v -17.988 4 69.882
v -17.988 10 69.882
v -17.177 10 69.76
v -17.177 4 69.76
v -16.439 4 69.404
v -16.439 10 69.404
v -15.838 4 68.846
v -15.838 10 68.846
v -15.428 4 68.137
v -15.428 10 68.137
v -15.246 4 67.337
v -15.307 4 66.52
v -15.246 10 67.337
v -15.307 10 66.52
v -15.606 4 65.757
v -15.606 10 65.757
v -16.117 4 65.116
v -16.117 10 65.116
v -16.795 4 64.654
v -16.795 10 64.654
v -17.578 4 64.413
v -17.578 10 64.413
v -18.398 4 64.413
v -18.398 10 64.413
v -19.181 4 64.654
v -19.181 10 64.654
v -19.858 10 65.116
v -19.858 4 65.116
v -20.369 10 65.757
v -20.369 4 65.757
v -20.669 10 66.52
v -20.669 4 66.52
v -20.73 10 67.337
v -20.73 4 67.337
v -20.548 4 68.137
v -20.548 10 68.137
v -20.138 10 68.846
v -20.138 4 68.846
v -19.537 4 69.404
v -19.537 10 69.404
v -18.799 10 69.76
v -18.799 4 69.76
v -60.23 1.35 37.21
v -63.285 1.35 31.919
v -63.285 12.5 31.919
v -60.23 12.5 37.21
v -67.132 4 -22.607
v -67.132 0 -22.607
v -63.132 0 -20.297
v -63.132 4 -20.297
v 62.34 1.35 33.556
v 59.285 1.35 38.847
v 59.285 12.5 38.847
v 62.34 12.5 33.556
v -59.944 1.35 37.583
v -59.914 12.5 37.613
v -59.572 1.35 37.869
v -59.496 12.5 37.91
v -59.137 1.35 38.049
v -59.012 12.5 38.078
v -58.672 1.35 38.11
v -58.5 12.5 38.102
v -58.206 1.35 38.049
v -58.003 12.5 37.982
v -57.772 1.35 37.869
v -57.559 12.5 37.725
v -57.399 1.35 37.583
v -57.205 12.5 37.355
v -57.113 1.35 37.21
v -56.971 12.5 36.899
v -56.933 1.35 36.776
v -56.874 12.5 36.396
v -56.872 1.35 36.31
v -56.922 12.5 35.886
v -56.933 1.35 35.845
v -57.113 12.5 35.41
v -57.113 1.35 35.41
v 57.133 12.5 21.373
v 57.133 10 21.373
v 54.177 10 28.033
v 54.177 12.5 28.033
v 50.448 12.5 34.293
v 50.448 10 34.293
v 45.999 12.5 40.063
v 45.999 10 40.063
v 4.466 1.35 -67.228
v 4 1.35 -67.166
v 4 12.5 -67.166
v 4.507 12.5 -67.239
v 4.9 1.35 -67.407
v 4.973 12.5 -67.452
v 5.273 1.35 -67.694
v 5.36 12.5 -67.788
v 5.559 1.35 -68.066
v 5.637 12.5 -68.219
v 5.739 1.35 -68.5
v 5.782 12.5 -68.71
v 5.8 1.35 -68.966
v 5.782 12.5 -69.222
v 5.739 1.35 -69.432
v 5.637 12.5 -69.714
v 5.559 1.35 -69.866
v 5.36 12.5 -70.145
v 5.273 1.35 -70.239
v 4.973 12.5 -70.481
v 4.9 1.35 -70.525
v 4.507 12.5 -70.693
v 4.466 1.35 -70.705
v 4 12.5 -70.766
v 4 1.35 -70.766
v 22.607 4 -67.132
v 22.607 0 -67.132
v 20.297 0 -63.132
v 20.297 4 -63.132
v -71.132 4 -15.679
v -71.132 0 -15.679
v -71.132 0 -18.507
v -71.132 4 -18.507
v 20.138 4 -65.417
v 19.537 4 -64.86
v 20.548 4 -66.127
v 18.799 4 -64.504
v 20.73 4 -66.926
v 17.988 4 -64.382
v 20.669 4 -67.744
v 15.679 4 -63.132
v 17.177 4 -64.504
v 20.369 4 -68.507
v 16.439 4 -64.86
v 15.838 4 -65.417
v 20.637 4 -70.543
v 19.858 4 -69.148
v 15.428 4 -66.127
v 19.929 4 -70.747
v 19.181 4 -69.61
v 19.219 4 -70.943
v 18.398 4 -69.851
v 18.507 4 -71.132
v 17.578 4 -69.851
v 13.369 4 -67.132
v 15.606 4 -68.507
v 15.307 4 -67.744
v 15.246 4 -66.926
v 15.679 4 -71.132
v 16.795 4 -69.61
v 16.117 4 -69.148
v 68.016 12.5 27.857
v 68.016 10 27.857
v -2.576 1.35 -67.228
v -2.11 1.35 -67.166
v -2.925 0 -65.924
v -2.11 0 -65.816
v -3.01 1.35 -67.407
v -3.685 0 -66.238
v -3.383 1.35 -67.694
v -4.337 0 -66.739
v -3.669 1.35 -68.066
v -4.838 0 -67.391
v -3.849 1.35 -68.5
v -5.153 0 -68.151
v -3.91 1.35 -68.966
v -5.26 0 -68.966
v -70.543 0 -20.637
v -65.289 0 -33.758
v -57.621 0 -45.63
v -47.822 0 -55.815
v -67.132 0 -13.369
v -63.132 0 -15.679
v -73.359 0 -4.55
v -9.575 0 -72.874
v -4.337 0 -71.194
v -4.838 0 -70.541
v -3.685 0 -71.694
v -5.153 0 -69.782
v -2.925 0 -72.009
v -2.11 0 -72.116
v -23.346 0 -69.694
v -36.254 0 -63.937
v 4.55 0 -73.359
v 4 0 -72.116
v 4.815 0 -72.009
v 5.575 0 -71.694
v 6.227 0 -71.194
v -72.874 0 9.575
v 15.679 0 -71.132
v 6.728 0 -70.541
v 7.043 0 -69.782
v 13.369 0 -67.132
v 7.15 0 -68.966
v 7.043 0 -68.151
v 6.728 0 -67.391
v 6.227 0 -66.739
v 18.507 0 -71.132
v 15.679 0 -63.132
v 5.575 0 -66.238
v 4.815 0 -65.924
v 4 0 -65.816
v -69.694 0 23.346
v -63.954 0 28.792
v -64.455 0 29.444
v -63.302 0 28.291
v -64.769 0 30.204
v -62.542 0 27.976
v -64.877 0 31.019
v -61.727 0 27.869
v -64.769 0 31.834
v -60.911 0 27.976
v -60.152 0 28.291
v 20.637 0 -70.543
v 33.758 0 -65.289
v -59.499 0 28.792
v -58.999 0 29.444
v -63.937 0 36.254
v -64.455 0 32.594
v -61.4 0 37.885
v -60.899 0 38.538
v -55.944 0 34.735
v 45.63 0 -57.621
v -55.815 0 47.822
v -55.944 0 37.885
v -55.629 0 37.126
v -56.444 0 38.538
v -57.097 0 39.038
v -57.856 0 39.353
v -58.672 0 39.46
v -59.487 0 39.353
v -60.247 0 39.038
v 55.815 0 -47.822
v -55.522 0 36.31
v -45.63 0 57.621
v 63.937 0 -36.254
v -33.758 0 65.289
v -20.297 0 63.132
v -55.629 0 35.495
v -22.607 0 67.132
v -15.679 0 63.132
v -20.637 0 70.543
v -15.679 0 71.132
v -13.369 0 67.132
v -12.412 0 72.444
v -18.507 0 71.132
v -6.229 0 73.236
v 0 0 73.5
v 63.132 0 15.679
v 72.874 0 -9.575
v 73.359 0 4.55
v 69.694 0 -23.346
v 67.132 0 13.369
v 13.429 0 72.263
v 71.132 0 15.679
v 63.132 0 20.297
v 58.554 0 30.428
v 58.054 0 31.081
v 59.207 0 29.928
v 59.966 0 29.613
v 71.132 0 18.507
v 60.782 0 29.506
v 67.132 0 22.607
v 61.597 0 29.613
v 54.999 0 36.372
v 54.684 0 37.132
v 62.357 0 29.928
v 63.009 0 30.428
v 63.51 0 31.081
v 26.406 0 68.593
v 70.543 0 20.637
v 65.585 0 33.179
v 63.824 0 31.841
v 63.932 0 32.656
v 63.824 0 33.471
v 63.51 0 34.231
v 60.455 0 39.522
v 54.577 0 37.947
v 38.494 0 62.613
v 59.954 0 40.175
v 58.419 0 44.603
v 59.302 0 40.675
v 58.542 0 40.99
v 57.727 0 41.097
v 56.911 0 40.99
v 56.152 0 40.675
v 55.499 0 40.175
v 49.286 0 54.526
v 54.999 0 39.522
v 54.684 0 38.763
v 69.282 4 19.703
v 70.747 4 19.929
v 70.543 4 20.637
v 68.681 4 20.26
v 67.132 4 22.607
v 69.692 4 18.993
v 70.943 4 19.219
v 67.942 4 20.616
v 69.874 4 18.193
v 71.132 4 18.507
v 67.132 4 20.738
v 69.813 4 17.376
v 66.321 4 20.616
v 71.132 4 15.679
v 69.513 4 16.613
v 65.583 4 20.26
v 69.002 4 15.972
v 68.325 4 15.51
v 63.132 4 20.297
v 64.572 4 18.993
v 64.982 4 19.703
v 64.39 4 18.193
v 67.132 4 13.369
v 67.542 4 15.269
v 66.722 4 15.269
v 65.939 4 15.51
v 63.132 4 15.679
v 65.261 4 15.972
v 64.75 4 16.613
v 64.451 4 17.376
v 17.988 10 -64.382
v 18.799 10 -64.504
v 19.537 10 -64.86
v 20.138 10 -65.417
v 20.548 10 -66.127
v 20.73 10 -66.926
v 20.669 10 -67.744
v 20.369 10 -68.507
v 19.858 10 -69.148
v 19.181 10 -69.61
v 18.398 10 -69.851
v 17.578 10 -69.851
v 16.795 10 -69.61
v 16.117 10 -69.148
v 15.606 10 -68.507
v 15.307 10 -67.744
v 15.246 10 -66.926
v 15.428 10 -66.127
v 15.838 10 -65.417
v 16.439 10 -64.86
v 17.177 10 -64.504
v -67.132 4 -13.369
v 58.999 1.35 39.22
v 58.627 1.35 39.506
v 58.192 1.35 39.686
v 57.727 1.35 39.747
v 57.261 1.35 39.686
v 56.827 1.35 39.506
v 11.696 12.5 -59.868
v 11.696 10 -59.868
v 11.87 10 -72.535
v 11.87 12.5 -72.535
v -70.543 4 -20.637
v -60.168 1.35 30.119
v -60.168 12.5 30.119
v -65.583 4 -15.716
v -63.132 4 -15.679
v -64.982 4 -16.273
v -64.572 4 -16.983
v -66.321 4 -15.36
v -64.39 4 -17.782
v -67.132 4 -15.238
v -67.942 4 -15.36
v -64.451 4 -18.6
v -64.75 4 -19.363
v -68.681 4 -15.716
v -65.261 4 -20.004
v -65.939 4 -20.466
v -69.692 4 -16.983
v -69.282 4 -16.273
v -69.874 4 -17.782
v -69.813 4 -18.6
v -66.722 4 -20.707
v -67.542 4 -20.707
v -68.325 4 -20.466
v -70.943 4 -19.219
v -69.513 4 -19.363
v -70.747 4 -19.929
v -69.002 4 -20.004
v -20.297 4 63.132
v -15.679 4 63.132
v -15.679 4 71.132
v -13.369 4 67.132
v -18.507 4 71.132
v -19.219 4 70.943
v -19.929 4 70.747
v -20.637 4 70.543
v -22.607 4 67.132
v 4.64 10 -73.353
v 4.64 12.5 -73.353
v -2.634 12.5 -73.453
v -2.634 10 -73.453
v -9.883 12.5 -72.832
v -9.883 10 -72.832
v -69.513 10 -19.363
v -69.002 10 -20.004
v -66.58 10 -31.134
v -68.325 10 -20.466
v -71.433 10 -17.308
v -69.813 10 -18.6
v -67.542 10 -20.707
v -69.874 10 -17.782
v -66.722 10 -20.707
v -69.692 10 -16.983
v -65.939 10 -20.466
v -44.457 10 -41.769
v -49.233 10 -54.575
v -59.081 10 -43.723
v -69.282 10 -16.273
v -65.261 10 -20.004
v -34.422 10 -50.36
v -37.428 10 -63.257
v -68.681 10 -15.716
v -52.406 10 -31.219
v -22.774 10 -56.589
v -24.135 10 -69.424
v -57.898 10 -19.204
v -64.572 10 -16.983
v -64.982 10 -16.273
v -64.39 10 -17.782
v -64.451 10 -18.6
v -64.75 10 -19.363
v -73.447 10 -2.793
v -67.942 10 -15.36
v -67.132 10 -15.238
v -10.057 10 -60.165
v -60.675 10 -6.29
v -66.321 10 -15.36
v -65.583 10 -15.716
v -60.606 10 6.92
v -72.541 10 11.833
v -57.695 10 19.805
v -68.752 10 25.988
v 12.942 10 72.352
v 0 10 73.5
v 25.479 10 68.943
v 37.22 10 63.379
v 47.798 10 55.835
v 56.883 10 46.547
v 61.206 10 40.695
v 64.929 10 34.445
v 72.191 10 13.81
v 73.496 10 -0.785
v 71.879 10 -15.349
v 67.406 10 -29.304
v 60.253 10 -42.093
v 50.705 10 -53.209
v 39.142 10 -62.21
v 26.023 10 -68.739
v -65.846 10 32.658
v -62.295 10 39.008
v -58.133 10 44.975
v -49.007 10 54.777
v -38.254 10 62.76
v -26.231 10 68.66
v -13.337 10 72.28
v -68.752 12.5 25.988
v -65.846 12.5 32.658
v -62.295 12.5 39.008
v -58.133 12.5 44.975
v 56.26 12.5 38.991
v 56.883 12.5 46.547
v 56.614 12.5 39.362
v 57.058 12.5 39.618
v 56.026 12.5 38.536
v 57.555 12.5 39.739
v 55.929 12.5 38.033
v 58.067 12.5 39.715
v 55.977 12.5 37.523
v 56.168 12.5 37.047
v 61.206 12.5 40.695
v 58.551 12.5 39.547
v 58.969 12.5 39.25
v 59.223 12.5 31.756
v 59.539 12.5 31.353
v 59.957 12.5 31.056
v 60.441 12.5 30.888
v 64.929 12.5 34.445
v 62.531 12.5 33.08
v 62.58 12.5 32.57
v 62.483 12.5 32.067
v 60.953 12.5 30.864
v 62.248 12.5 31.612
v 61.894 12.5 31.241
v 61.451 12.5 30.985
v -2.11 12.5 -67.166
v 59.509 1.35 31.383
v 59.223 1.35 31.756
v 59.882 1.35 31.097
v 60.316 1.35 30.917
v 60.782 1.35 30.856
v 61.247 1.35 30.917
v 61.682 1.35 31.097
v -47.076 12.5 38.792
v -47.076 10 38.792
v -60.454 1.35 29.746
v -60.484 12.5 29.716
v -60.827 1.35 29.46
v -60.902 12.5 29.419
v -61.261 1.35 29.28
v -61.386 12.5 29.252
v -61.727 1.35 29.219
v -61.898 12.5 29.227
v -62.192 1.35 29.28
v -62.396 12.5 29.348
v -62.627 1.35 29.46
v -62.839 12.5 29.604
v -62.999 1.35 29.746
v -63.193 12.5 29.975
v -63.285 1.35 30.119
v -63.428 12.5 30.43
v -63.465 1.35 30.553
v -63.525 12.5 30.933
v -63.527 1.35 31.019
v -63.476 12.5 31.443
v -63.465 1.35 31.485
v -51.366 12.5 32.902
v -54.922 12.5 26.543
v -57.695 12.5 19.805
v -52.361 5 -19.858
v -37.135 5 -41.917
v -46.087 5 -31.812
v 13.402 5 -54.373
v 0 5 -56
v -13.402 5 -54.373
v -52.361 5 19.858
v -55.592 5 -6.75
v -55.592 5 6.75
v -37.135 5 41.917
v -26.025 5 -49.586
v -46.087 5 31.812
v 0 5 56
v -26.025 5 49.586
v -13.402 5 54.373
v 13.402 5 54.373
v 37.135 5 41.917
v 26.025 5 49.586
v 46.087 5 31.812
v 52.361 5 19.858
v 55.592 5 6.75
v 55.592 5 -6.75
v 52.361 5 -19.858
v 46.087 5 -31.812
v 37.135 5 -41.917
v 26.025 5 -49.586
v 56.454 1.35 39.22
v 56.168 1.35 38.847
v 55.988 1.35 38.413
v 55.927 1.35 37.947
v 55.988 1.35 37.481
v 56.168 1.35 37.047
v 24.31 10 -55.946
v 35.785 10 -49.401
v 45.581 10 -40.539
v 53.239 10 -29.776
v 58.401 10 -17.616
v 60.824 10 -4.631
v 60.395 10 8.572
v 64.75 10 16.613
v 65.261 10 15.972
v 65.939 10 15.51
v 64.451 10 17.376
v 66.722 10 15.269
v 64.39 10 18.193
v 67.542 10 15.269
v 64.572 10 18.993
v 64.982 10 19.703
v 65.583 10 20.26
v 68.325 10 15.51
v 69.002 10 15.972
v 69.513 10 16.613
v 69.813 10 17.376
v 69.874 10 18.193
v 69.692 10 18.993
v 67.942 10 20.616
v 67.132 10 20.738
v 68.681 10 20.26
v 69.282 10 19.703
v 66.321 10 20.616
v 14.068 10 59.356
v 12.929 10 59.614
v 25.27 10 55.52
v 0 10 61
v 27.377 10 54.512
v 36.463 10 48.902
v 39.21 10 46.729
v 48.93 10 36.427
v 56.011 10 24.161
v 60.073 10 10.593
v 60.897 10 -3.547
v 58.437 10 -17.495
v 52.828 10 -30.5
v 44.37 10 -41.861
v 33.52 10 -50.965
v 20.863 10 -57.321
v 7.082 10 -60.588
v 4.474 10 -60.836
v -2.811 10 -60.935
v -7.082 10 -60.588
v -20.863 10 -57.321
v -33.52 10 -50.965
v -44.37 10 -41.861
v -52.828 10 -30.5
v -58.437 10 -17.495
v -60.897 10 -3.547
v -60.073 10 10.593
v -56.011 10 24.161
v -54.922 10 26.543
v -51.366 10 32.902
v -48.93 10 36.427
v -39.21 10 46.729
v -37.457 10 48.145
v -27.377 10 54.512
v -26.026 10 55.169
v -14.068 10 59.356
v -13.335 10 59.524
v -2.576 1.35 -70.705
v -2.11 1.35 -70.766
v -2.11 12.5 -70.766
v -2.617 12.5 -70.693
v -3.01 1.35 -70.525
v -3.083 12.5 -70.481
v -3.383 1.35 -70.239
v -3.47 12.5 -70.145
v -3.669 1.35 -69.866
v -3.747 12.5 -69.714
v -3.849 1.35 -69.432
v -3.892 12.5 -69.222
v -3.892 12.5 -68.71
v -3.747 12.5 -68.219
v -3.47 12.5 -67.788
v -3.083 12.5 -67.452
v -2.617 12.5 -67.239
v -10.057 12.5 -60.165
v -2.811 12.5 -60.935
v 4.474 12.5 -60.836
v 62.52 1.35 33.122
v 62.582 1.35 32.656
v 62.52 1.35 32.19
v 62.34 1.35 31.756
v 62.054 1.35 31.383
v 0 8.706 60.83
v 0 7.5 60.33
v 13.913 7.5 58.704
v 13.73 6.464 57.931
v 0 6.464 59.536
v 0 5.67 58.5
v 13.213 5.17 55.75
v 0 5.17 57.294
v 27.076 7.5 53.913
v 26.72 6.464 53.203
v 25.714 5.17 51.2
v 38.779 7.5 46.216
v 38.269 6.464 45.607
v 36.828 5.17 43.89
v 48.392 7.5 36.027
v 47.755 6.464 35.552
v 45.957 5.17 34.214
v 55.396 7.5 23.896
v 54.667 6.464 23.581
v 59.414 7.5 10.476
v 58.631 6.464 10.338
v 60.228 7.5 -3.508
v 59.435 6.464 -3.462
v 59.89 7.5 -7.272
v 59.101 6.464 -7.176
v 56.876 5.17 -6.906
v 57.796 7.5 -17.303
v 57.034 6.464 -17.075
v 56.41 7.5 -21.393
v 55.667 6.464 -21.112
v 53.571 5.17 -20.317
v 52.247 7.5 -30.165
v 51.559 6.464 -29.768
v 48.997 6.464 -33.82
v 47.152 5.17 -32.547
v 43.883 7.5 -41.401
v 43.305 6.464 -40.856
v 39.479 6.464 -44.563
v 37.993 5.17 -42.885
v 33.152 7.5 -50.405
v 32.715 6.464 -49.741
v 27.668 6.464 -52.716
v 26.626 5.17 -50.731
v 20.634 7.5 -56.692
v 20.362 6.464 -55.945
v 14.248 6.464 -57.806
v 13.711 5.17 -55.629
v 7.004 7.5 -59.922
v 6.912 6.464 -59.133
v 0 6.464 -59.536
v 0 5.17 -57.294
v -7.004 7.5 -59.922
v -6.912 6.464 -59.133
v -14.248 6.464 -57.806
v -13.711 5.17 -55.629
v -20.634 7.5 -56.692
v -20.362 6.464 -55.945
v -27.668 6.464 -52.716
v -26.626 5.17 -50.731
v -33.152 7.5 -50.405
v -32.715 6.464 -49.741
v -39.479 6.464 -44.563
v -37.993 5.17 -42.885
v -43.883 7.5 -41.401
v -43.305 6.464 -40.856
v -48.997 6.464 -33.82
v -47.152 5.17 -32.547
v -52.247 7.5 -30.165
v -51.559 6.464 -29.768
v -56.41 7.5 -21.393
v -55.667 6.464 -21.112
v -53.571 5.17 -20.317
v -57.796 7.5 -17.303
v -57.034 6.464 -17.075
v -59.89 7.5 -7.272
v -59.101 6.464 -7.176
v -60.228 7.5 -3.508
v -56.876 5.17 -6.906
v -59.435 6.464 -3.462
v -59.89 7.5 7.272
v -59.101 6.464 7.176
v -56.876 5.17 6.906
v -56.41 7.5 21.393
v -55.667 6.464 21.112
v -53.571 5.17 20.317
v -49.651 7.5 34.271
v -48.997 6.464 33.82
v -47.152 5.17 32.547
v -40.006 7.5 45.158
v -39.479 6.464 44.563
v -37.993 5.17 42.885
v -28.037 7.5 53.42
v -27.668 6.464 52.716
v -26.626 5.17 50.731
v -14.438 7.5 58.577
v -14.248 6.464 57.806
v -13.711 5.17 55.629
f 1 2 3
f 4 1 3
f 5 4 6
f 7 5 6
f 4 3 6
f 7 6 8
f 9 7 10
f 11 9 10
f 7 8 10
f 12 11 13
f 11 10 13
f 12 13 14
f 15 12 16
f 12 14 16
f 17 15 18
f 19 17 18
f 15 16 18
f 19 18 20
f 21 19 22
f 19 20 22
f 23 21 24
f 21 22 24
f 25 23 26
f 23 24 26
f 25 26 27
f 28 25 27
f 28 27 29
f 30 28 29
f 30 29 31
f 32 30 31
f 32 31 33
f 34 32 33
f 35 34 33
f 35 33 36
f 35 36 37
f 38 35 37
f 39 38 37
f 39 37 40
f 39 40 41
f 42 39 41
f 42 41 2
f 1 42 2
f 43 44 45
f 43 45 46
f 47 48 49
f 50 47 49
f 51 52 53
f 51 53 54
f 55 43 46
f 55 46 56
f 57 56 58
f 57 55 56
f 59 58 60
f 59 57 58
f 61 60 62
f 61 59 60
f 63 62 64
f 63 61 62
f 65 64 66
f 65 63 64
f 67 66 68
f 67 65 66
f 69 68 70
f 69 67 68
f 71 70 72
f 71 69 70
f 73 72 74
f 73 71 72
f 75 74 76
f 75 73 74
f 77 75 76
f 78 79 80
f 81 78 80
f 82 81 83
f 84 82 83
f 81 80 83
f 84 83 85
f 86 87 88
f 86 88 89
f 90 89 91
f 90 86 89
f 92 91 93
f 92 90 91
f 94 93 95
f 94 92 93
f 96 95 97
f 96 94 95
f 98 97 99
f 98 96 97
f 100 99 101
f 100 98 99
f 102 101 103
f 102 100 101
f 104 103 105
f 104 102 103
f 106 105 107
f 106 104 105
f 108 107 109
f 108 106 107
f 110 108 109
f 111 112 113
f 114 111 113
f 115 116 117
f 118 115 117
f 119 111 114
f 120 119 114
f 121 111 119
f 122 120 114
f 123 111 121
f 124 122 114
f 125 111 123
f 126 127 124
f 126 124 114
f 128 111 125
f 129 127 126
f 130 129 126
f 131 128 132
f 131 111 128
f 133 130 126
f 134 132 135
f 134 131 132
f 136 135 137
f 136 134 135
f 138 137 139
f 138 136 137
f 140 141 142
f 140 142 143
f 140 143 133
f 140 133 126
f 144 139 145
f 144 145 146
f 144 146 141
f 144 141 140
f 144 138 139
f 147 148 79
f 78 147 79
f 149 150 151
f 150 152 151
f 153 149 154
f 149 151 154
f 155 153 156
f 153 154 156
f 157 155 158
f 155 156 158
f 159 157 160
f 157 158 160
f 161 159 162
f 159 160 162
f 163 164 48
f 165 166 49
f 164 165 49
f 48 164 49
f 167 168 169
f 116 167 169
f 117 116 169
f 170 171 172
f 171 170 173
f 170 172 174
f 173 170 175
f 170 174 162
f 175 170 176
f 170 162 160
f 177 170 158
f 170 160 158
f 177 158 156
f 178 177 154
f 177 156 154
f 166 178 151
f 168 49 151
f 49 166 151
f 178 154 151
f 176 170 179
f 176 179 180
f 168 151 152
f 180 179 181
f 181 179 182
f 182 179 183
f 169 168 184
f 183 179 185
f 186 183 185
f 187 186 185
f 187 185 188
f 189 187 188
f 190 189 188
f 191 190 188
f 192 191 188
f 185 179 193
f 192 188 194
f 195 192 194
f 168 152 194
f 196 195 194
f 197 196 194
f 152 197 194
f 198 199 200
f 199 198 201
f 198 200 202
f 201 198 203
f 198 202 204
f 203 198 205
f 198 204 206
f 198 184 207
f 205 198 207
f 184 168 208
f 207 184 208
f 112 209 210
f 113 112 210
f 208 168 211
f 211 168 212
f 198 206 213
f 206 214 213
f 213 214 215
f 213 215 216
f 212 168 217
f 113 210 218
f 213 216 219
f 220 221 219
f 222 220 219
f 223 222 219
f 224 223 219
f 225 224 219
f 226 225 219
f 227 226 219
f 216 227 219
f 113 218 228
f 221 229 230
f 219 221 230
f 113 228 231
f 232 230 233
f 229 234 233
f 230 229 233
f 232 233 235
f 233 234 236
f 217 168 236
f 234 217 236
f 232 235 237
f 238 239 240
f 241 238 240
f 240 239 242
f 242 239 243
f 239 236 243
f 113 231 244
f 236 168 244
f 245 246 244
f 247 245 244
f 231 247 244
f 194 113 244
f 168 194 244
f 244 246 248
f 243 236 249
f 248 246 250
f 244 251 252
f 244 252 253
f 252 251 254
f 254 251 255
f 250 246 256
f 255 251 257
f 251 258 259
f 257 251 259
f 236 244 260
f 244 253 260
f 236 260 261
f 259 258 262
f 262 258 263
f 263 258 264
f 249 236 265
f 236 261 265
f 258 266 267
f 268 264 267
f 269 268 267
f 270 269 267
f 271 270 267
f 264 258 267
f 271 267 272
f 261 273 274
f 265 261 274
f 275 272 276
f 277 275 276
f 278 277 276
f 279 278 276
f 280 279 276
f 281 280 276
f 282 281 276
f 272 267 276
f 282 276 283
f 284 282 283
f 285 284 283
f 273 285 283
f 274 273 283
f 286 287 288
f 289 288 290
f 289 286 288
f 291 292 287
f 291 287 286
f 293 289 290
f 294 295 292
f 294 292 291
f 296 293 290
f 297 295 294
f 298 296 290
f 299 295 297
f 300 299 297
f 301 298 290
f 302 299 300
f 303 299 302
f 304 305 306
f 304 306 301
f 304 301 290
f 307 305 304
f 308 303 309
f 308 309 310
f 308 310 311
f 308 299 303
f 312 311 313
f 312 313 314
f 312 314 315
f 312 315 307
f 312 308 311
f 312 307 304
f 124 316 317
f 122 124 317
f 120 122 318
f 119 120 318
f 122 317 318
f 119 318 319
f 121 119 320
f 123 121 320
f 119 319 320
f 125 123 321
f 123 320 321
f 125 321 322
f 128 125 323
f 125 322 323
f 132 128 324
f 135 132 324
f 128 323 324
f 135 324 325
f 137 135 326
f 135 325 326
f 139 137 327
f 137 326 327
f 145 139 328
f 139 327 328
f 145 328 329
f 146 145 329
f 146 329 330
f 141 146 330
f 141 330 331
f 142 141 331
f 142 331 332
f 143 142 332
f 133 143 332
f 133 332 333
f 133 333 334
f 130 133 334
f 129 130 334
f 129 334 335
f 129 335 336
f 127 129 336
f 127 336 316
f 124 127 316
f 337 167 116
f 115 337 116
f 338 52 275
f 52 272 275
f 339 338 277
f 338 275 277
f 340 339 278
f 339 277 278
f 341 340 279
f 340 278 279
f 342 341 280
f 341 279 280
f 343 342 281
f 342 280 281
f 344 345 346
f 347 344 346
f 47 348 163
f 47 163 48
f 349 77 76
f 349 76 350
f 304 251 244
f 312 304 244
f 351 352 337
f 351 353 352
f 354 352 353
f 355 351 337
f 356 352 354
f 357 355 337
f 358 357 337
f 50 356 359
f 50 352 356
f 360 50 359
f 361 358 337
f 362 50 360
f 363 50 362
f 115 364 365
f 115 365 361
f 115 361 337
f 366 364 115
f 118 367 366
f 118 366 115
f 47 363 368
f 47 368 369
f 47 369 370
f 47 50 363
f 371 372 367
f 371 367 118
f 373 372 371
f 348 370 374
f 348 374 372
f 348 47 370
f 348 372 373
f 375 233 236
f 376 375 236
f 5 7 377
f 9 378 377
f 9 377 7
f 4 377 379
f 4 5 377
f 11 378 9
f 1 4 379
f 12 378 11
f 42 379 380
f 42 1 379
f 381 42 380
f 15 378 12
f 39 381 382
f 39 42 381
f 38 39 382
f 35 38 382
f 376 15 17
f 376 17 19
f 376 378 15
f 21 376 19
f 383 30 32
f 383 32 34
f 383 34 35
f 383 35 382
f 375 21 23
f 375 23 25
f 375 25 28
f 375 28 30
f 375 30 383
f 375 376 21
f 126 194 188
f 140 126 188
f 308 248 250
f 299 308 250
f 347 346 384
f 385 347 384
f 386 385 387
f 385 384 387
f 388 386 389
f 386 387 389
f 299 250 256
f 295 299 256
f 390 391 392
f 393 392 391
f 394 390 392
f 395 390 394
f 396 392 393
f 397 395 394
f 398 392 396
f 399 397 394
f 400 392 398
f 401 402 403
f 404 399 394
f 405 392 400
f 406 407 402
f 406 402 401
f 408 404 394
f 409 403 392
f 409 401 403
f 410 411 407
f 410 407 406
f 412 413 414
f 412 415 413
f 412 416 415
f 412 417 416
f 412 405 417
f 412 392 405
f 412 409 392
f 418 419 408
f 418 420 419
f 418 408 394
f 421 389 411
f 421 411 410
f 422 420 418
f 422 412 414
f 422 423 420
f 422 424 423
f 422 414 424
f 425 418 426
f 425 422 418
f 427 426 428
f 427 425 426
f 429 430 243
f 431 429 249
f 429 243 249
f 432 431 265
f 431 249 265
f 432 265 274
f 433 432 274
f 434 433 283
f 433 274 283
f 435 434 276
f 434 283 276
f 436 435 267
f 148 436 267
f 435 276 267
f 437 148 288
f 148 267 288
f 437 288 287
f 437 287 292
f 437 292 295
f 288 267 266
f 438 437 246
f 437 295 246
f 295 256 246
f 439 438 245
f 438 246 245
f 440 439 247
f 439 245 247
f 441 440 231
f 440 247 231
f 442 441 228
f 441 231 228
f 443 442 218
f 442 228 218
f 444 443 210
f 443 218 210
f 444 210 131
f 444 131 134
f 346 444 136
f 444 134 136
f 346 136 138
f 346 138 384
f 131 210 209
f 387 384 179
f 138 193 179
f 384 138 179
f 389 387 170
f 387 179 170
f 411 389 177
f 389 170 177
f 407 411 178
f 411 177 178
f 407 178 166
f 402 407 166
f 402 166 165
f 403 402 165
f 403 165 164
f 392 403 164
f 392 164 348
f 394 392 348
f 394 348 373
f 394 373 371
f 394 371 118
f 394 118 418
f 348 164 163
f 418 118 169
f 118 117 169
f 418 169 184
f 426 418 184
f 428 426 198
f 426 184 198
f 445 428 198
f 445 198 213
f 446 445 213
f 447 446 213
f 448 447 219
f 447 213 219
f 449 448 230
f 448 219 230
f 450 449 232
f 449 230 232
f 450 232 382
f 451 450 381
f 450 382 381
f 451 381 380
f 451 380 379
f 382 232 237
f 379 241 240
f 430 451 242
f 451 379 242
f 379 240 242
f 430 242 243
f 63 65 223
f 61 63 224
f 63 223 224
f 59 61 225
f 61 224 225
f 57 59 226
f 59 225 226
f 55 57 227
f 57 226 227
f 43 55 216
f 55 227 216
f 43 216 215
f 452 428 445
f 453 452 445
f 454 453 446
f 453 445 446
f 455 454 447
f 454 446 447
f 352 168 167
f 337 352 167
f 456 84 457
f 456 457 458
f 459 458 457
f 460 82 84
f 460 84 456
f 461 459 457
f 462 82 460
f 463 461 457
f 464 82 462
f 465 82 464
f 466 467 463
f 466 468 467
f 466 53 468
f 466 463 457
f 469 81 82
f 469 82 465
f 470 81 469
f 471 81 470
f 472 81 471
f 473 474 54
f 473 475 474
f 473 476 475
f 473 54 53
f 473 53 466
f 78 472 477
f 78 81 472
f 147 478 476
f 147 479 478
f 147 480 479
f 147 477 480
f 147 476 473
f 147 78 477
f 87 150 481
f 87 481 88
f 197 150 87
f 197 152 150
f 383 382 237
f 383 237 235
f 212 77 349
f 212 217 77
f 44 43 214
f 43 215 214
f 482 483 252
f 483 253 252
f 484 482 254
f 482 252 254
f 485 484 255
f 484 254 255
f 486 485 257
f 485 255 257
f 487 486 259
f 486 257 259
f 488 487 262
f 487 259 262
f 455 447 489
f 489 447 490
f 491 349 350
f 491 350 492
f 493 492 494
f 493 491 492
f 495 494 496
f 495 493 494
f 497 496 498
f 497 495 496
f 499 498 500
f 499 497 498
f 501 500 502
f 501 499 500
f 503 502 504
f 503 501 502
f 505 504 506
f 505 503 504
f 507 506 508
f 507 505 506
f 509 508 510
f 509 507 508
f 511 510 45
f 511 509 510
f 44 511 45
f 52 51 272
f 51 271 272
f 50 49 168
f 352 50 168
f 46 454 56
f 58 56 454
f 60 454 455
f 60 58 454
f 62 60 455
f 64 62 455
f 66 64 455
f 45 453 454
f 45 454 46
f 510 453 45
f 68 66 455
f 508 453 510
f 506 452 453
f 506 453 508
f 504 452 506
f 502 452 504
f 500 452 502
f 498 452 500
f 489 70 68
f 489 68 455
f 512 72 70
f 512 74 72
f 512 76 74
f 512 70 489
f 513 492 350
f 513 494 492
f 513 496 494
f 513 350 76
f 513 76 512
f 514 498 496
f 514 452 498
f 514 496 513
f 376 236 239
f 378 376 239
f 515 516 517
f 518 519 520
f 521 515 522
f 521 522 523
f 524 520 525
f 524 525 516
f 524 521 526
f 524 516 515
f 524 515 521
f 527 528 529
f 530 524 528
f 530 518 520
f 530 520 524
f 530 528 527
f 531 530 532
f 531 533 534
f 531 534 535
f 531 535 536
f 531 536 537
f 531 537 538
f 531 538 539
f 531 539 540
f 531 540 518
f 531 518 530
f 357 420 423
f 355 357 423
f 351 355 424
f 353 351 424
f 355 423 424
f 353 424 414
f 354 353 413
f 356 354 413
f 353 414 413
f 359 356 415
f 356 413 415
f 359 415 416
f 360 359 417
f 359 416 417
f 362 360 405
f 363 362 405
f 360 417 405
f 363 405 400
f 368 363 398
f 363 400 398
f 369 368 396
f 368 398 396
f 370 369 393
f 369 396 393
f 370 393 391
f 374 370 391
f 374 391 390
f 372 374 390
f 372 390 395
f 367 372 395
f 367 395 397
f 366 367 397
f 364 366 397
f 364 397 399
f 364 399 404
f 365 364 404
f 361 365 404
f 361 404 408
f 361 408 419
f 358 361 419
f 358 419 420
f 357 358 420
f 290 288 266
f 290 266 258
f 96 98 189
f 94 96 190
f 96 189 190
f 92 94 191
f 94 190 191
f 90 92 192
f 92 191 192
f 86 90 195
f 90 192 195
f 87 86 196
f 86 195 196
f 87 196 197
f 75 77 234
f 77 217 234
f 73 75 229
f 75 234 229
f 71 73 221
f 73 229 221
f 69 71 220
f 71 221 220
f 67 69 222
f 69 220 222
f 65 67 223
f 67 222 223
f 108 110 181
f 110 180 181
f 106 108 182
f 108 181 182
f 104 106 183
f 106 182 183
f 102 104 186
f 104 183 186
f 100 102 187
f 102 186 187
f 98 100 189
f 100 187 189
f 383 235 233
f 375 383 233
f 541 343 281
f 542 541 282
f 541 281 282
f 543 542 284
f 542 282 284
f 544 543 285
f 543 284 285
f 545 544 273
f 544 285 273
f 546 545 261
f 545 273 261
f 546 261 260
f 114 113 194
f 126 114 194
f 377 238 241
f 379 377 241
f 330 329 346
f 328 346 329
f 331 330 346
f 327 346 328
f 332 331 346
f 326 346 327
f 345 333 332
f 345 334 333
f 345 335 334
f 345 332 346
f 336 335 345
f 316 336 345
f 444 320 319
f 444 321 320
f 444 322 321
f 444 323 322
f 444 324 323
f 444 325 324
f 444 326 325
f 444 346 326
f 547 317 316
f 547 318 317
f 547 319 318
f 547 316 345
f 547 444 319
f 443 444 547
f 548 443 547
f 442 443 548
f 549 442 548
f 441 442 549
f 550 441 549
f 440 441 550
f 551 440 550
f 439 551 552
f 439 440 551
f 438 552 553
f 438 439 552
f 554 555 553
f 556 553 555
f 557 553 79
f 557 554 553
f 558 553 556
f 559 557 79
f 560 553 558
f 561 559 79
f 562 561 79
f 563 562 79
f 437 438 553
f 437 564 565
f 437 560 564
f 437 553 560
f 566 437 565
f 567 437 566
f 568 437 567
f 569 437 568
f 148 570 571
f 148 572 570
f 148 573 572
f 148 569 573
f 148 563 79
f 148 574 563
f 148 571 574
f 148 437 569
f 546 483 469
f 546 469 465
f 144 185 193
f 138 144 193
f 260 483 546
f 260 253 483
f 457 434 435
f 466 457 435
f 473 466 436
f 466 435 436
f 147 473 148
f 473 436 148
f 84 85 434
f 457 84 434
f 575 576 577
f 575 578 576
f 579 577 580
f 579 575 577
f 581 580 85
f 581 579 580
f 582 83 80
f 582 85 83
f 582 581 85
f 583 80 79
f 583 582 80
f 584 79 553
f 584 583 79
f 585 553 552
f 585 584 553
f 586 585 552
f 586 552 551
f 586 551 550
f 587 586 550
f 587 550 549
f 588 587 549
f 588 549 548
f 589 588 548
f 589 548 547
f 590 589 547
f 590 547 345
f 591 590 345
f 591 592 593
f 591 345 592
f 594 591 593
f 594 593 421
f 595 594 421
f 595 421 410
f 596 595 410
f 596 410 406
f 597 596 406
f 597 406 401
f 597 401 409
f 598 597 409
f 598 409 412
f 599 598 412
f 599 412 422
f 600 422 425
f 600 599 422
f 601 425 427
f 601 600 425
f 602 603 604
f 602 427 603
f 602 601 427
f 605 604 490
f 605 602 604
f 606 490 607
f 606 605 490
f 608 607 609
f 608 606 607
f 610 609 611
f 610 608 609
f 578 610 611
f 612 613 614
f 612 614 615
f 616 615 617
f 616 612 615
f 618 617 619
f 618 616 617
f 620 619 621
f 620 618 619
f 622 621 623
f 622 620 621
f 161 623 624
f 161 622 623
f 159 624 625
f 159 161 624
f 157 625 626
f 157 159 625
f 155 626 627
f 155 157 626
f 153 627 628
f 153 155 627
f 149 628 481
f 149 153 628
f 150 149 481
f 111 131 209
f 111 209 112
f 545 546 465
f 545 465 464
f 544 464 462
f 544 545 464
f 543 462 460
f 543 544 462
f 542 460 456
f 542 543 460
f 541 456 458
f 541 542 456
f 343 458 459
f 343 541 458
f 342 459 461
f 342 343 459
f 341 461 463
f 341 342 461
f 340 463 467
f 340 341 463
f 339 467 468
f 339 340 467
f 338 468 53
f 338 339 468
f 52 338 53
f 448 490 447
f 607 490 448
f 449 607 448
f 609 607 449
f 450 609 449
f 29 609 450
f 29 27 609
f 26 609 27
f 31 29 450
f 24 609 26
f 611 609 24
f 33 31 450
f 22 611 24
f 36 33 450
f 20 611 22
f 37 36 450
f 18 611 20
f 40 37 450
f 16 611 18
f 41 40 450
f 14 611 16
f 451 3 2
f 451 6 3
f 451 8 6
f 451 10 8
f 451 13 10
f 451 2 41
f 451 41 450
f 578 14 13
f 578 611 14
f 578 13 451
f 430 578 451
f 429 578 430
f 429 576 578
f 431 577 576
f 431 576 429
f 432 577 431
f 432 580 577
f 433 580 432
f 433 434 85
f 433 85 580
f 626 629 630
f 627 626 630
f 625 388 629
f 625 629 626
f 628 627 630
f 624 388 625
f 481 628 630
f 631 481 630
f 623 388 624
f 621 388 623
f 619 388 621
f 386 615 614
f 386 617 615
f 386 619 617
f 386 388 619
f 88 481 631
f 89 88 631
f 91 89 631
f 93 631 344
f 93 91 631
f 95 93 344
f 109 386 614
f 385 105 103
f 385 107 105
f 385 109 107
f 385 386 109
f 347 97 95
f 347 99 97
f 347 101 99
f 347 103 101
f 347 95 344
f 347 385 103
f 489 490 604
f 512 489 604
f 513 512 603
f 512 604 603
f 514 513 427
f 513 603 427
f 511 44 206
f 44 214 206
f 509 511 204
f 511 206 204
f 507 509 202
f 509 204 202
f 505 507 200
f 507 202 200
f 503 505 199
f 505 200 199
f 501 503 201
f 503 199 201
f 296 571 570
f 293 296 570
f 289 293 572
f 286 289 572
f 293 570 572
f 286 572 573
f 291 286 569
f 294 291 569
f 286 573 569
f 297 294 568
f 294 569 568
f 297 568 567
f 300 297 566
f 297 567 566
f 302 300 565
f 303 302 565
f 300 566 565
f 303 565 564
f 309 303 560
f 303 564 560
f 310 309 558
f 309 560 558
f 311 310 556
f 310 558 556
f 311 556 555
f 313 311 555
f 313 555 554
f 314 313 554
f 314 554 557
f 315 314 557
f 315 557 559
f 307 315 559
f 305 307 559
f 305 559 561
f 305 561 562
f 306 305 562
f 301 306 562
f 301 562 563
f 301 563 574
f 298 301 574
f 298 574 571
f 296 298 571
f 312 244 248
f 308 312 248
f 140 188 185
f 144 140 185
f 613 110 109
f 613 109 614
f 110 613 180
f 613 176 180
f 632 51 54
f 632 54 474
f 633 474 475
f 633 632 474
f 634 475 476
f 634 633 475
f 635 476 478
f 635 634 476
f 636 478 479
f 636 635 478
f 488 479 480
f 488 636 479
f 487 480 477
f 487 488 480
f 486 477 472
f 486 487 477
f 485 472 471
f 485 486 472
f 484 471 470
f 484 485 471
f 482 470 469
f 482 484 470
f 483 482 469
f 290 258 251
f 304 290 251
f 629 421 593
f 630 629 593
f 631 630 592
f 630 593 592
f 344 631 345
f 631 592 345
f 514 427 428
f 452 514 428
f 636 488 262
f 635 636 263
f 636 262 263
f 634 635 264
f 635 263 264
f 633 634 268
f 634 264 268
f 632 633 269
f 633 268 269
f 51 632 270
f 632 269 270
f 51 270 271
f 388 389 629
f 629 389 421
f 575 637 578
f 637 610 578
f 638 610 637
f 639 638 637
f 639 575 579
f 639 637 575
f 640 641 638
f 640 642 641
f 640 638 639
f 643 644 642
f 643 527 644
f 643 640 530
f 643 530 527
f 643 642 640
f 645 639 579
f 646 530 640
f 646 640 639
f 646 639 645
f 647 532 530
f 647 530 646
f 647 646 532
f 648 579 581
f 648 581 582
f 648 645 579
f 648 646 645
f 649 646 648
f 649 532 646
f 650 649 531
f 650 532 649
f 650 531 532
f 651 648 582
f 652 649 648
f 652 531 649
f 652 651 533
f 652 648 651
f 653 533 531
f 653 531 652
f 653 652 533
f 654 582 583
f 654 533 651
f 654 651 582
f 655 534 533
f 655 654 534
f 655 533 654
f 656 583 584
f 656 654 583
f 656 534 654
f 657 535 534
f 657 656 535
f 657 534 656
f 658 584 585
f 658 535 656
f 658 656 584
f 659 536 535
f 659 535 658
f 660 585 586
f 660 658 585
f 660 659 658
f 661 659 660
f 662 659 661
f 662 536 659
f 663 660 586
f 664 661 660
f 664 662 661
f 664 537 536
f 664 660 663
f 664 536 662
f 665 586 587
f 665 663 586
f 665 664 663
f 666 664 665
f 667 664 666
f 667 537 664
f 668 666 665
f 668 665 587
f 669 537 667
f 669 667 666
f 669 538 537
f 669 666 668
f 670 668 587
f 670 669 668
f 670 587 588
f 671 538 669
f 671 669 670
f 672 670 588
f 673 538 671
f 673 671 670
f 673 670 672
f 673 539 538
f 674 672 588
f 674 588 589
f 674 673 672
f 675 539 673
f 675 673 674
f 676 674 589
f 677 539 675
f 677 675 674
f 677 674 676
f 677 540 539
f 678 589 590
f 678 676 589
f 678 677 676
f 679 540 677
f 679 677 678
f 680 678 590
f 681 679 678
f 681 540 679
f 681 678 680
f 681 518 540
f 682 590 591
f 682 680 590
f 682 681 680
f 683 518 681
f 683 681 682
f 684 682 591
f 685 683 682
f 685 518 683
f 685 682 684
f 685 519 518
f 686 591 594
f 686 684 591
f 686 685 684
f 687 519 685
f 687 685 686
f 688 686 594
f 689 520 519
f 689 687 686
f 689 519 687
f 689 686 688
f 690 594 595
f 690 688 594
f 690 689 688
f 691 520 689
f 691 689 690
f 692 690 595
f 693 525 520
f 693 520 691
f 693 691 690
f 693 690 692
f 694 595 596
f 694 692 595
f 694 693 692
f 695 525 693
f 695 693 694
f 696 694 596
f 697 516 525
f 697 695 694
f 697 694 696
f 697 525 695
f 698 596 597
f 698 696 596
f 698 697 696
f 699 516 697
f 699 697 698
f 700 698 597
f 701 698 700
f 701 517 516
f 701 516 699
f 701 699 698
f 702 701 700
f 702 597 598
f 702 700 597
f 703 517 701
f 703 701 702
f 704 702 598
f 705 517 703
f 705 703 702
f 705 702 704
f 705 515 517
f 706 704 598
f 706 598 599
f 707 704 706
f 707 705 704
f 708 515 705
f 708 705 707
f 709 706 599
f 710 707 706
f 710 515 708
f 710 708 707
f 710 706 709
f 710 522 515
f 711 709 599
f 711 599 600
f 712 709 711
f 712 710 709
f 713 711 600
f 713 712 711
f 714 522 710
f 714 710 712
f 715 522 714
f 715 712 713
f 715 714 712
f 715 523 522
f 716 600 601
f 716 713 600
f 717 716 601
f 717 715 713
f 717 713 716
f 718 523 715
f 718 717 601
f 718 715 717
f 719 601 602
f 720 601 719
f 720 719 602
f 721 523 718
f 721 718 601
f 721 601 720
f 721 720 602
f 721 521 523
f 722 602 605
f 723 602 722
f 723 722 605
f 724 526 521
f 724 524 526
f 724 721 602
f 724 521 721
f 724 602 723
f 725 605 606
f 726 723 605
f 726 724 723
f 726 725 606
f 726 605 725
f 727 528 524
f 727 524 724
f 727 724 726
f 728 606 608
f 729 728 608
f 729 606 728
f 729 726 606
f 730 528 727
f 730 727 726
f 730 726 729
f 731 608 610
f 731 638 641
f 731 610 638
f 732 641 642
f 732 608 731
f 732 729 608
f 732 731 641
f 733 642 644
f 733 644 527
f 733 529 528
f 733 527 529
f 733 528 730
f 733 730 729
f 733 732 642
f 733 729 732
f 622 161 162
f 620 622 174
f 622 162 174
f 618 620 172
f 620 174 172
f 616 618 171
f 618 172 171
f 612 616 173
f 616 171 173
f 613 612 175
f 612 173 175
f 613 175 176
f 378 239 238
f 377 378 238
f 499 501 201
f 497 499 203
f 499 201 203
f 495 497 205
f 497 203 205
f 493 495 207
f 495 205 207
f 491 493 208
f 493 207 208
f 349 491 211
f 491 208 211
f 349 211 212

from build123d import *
from build123d.topology import SkipClean

# Parameters (mm, degrees)
CROQUIS1_R                                     = 73.5
SALIENTE_EXTRUIR1_DEPTH                        = 5
CROQUIS7_R                                     = 73.5
CROQUIS7_R_2                                   = 61
SALIENTE_EXTRUIR2_DEPTH                        = 5
CROQUIS8_R                                     = 2.75
CORTAR_EXTRUIR5_DEPTH                          = 105.424613957
CORTAR_EXTRUIR6_DEPTH                          = 4
BOSS_EXTRUDE1_DEPTH                            = 2.5
CSK_SLOT_FOR_M3_FLAT_HEAD_MACHINE_SCREW1_DEPTH = 12.5
CIRPATTERN1_COUNT                              = 3
FILLET3_R                                      = 5


with BuildPart() as part:
    # Croquis1 → Saliente-Extruir1 (new body)
    with BuildSketch(Plane(origin=(0, 0, 0), x_dir=(1, 0, 0), z_dir=(0, 1, 0))):
        with Locations(Location((0, 0, 0), (0, 0, 270))):
            Circle(CROQUIS1_R)
    extrude(amount=SALIENTE_EXTRUIR1_DEPTH)

    # Croquis7 → Saliente-Extruir2 (add)
    with BuildSketch(Plane(origin=(0, 5, 0), x_dir=(1, 0, 0), z_dir=(0, 1, 0))):
        with Locations(Location((0, 0, 0), (0, 0, 270))):
            Circle(CROQUIS7_R)
        with Locations(Location((0, 0, 0), (0, 0, 270))):
            Circle(CROQUIS7_R_2, mode=Mode.SUBTRACT)
    extrude(amount=SALIENTE_EXTRUIR2_DEPTH)

    # Croquis8 → Cortar-Extruir5 (cut, through all)
    with BuildSketch(Plane(origin=(0, 10, 0), x_dir=(1, 0, 0), z_dir=(0, 1, 0))):
        with Locations(Location((-17.987923635, -67.131844927, 0), (0, 0, 270))):
            Circle(CROQUIS8_R)
        with Locations(Location((-67.131844927, 17.987923635, 0), (0, 0, 270))):
            Circle(CROQUIS8_R)
        with Locations(Location((17.987923635, 67.131844927, 0), (0, 0, 270))):
            Circle(CROQUIS8_R)
        with Locations(Location((67.131844927, -17.987923635, 0), (0, 0, 270))):
            Circle(CROQUIS8_R)
    extrude(amount=-CORTAR_EXTRUIR5_DEPTH, mode=Mode.SUBTRACT)

    # Croquis9 → Cortar-Extruir6 (cut)
    with BuildSketch(Plane(origin=(0, 0, 0), x_dir=(-1, 0, 0), z_dir=(0, -1, 0))):
        Polygon((20.297324711, -63.131844927), (15.678522558, -63.131844927), (13.369121481, -67.131844927), (15.678522558, -71.131844927), (20.297324711, -71.131844927), (22.606725788, -67.131844927), align=None)
        Polygon((-63.131844927, -20.297324711), (-63.131844927, -15.678522558), (-67.131844927, -13.369121481), (-71.131844927, -15.678522558), (-71.131844927, -20.297324711), (-67.131844927, -22.606725788), align=None)
        Polygon((-20.297324711, 63.131844927), (-15.678522558, 63.131844927), (-13.369121481, 67.131844927), (-15.678522558, 71.131844927), (-20.297324711, 71.131844927), (-22.606725788, 67.131844927), align=None)
        Polygon((63.131844927, 20.297324711), (63.131844927, 15.678522558), (67.131844927, 13.369121481), (71.131844927, 15.678522558), (71.131844927, 20.297324711), (67.131844927, 22.606725788), align=None)
    extrude(amount=-CORTAR_EXTRUIR6_DEPTH, mode=Mode.SUBTRACT)

    # Sketch3 → Boss-Extrude1 (add)
    with SkipClean():  # the faces are left unmerged after this step: merging them gives an invalid solid
        with BuildSketch(Plane(origin=(0, 10, 0), x_dir=(1, 0, 0), z_dir=(0, 1, 0))):
            with BuildLine():
                Line((11.696105723, 59.868197826), (11.869621272, 72.535247231))
                ThreePointArc((11.869621272, 72.535247231), (1.004194341, 73.493139773), (-9.883348207, 72.832475093))
                Line((-9.883348207, 72.832475093), (-10.056865919, 60.165267787))
                ThreePointArc((-10.056865919, 60.165267787), (0.832970242, 60.994312526), (11.696105723, 59.868197826))
            make_face()
            with BuildLine():
                Line((-57.695433057, -19.804974232), (-68.752177408, -25.98823006))
                ThreePointArc((-68.752177408, -25.98823006), (-64.149023218, -35.876912077), (-58.133099548, -44.975468168))
                Line((-58.133099548, -44.975468168), (-47.076217369, -38.792135262))
                ThreePointArc((-47.076217369, -38.792135262), (-53.239109255, -29.775782873), (-57.695433057, -19.804974232))
            make_face()
            with BuildLine():
                Line((45.999327335, -40.063223594), (56.882556136, -46.547017171))
                ThreePointArc((56.882556136, -46.547017171), (63.144828877, -37.616227696), (68.016447755, -27.857006925))
                Line((68.016447755, -27.857006925), (57.133083289, -21.373132525))
                ThreePointArc((57.133083289, -21.373132525), (52.406139013, -31.218529653), (45.999327335, -40.063223594))
            make_face()
        extrude(amount=BOSS_EXTRUDE1_DEPTH)

    # CSK SLOT for M3 Flat Head Machine Screw1: read off the stored shape, not the designer's step
    # CSK SLOT for M3 Flat Head Machine Sc 2 → CSK SLOT for M3 Flat Head Machine Screw1 (cut)
    with SkipClean():  # the faces are left unmerged after this step: merging them gives an invalid solid
        with BuildSketch(Plane(origin=(0, 0, 0), x_dir=(1, 0, 0), z_dir=(0, 1, 0))):
            with BuildLine():
                ThreePointArc((-60.230442327, -37.210480227), (-57.7715966, -37.869325954), (-57.112750874, -35.410480227))
                Line((-57.112750874, -35.410480227), (-60.167750874, -30.11906501))
                ThreePointArc((-60.167750874, -30.11906501), (-62.626596601, -29.460219283), (-63.285442327, -31.91906501))
                Line((-63.285442327, -31.91906501), (-60.230442327, -37.210480227))
            make_face()
        csk_slot_for_m3_flat_head_machine_screw1 = extrude(amount=CSK_SLOT_FOR_M3_FLAT_HEAD_MACHINE_SCREW1_DEPTH, mode=Mode.SUBTRACT)

    # CSK SLOT for M3 Flat Head Machine Sc 3: loft between two sections, ruled curve by curve
    with SkipClean():  # the faces are left unmerged after this step: merging them gives an invalid solid
        csk_slot_for_m3_flat_head_machine_sc_3_from = [
            Edge.make_three_point_arc((-57.112750874, 1.35, 35.410480227), (-56.932930113, 1.35, 36.776354508), (-57.7715966, 1.35, 37.869325954)),
            Edge.make_three_point_arc((-57.7715966, 1.35, 37.869325954), (-59.137470882, 1.35, 38.049146714), (-60.230442327, 1.35, 37.210480227)),
            Edge.make_three_point_arc((-63.285442327, 1.35, 31.91906501), (-63.465263088, 1.35, 30.553190729), (-62.6265966, 1.35, 29.460219283)),
            Edge.make_three_point_arc((-62.6265966, 1.35, 29.460219283), (-61.260722319, 1.35, 29.280398523), (-60.167750874, 1.35, 30.11906501)),
            Edge.make_line((-60.230442327, 1.35, 37.210480227), (-63.285442327, 1.35, 31.91906501)),
            Edge.make_line((-57.112750874, 1.35, 35.410480227), (-60.167750874, 1.35, 30.11906501)),
        ]
        csk_slot_for_m3_flat_head_machine_sc_3_to = [
            Edge.make_three_point_arc((-55.943616578, 0, 34.735480227), (-55.628930248, 0, 37.125760219), (-57.0965966, 0, 39.038460249)),
            Edge.make_three_point_arc((-57.0965966, 0, 39.038460249), (-59.486876592, 0, 39.35314658), (-61.399576622, 0, 37.885480227)),
            Edge.make_three_point_arc((-64.454576622, 0, 32.59406501), (-64.769262953, 0, 30.203785018), (-63.3015966, 0, 28.291084988)),
            Edge.make_three_point_arc((-63.3015966, 0, 28.291084988), (-60.911316608, 0, 27.976398657), (-58.998616578, 0, 29.44406501)),
            Edge.make_line((-61.399576622, 0, 37.885480227), (-64.454576622, 0, 32.59406501)),
            Edge.make_line((-55.943616578, 0, 34.735480227), (-58.998616578, 0, 29.44406501)),
        ]
        csk_slot_for_m3_flat_head_machine_sc_3 = Solid(Shell([*[Face.make_surface_from_curves(csk_slot_for_m3_flat_head_machine_sc_3_from[k], csk_slot_for_m3_flat_head_machine_sc_3_to[k]) for k in range(6)], Face(Wire(csk_slot_for_m3_flat_head_machine_sc_3_from)), Face(Wire(csk_slot_for_m3_flat_head_machine_sc_3_to))]))
        add(csk_slot_for_m3_flat_head_machine_sc_3, mode=Mode.SUBTRACT)

    # CirPattern1: CSK SLOT for M3 Flat Head Machine Screw1, CSK SLOT for M3 Flat Head Machine Sc 3 ×3 about axis
    with SkipClean():  # the faces are left unmerged after this step: merging them gives an invalid solid
        cirpattern1_axis = Axis((0, 0, 0), (0, 1, 0))
        add([csk_slot_for_m3_flat_head_machine_screw1.rotate(cirpattern1_axis, i * 360 / CIRPATTERN1_COUNT) for i in range(1, CIRPATTERN1_COUNT)], mode=Mode.SUBTRACT)
        add([csk_slot_for_m3_flat_head_machine_sc_3.rotate(cirpattern1_axis, i * 360 / CIRPATTERN1_COUNT) for i in range(1, CIRPATTERN1_COUNT)], mode=Mode.SUBTRACT)

    # Fillet3
    fillet3_edges = [part.edges().sort_by_distance(p)[0] for p in [
        (0, 5, -61),
    ]]
    fillet(fillet3_edges, radius=FILLET3_R - 0.0001)  # a hair under: the kernel refuses the full size


solid = part.part
